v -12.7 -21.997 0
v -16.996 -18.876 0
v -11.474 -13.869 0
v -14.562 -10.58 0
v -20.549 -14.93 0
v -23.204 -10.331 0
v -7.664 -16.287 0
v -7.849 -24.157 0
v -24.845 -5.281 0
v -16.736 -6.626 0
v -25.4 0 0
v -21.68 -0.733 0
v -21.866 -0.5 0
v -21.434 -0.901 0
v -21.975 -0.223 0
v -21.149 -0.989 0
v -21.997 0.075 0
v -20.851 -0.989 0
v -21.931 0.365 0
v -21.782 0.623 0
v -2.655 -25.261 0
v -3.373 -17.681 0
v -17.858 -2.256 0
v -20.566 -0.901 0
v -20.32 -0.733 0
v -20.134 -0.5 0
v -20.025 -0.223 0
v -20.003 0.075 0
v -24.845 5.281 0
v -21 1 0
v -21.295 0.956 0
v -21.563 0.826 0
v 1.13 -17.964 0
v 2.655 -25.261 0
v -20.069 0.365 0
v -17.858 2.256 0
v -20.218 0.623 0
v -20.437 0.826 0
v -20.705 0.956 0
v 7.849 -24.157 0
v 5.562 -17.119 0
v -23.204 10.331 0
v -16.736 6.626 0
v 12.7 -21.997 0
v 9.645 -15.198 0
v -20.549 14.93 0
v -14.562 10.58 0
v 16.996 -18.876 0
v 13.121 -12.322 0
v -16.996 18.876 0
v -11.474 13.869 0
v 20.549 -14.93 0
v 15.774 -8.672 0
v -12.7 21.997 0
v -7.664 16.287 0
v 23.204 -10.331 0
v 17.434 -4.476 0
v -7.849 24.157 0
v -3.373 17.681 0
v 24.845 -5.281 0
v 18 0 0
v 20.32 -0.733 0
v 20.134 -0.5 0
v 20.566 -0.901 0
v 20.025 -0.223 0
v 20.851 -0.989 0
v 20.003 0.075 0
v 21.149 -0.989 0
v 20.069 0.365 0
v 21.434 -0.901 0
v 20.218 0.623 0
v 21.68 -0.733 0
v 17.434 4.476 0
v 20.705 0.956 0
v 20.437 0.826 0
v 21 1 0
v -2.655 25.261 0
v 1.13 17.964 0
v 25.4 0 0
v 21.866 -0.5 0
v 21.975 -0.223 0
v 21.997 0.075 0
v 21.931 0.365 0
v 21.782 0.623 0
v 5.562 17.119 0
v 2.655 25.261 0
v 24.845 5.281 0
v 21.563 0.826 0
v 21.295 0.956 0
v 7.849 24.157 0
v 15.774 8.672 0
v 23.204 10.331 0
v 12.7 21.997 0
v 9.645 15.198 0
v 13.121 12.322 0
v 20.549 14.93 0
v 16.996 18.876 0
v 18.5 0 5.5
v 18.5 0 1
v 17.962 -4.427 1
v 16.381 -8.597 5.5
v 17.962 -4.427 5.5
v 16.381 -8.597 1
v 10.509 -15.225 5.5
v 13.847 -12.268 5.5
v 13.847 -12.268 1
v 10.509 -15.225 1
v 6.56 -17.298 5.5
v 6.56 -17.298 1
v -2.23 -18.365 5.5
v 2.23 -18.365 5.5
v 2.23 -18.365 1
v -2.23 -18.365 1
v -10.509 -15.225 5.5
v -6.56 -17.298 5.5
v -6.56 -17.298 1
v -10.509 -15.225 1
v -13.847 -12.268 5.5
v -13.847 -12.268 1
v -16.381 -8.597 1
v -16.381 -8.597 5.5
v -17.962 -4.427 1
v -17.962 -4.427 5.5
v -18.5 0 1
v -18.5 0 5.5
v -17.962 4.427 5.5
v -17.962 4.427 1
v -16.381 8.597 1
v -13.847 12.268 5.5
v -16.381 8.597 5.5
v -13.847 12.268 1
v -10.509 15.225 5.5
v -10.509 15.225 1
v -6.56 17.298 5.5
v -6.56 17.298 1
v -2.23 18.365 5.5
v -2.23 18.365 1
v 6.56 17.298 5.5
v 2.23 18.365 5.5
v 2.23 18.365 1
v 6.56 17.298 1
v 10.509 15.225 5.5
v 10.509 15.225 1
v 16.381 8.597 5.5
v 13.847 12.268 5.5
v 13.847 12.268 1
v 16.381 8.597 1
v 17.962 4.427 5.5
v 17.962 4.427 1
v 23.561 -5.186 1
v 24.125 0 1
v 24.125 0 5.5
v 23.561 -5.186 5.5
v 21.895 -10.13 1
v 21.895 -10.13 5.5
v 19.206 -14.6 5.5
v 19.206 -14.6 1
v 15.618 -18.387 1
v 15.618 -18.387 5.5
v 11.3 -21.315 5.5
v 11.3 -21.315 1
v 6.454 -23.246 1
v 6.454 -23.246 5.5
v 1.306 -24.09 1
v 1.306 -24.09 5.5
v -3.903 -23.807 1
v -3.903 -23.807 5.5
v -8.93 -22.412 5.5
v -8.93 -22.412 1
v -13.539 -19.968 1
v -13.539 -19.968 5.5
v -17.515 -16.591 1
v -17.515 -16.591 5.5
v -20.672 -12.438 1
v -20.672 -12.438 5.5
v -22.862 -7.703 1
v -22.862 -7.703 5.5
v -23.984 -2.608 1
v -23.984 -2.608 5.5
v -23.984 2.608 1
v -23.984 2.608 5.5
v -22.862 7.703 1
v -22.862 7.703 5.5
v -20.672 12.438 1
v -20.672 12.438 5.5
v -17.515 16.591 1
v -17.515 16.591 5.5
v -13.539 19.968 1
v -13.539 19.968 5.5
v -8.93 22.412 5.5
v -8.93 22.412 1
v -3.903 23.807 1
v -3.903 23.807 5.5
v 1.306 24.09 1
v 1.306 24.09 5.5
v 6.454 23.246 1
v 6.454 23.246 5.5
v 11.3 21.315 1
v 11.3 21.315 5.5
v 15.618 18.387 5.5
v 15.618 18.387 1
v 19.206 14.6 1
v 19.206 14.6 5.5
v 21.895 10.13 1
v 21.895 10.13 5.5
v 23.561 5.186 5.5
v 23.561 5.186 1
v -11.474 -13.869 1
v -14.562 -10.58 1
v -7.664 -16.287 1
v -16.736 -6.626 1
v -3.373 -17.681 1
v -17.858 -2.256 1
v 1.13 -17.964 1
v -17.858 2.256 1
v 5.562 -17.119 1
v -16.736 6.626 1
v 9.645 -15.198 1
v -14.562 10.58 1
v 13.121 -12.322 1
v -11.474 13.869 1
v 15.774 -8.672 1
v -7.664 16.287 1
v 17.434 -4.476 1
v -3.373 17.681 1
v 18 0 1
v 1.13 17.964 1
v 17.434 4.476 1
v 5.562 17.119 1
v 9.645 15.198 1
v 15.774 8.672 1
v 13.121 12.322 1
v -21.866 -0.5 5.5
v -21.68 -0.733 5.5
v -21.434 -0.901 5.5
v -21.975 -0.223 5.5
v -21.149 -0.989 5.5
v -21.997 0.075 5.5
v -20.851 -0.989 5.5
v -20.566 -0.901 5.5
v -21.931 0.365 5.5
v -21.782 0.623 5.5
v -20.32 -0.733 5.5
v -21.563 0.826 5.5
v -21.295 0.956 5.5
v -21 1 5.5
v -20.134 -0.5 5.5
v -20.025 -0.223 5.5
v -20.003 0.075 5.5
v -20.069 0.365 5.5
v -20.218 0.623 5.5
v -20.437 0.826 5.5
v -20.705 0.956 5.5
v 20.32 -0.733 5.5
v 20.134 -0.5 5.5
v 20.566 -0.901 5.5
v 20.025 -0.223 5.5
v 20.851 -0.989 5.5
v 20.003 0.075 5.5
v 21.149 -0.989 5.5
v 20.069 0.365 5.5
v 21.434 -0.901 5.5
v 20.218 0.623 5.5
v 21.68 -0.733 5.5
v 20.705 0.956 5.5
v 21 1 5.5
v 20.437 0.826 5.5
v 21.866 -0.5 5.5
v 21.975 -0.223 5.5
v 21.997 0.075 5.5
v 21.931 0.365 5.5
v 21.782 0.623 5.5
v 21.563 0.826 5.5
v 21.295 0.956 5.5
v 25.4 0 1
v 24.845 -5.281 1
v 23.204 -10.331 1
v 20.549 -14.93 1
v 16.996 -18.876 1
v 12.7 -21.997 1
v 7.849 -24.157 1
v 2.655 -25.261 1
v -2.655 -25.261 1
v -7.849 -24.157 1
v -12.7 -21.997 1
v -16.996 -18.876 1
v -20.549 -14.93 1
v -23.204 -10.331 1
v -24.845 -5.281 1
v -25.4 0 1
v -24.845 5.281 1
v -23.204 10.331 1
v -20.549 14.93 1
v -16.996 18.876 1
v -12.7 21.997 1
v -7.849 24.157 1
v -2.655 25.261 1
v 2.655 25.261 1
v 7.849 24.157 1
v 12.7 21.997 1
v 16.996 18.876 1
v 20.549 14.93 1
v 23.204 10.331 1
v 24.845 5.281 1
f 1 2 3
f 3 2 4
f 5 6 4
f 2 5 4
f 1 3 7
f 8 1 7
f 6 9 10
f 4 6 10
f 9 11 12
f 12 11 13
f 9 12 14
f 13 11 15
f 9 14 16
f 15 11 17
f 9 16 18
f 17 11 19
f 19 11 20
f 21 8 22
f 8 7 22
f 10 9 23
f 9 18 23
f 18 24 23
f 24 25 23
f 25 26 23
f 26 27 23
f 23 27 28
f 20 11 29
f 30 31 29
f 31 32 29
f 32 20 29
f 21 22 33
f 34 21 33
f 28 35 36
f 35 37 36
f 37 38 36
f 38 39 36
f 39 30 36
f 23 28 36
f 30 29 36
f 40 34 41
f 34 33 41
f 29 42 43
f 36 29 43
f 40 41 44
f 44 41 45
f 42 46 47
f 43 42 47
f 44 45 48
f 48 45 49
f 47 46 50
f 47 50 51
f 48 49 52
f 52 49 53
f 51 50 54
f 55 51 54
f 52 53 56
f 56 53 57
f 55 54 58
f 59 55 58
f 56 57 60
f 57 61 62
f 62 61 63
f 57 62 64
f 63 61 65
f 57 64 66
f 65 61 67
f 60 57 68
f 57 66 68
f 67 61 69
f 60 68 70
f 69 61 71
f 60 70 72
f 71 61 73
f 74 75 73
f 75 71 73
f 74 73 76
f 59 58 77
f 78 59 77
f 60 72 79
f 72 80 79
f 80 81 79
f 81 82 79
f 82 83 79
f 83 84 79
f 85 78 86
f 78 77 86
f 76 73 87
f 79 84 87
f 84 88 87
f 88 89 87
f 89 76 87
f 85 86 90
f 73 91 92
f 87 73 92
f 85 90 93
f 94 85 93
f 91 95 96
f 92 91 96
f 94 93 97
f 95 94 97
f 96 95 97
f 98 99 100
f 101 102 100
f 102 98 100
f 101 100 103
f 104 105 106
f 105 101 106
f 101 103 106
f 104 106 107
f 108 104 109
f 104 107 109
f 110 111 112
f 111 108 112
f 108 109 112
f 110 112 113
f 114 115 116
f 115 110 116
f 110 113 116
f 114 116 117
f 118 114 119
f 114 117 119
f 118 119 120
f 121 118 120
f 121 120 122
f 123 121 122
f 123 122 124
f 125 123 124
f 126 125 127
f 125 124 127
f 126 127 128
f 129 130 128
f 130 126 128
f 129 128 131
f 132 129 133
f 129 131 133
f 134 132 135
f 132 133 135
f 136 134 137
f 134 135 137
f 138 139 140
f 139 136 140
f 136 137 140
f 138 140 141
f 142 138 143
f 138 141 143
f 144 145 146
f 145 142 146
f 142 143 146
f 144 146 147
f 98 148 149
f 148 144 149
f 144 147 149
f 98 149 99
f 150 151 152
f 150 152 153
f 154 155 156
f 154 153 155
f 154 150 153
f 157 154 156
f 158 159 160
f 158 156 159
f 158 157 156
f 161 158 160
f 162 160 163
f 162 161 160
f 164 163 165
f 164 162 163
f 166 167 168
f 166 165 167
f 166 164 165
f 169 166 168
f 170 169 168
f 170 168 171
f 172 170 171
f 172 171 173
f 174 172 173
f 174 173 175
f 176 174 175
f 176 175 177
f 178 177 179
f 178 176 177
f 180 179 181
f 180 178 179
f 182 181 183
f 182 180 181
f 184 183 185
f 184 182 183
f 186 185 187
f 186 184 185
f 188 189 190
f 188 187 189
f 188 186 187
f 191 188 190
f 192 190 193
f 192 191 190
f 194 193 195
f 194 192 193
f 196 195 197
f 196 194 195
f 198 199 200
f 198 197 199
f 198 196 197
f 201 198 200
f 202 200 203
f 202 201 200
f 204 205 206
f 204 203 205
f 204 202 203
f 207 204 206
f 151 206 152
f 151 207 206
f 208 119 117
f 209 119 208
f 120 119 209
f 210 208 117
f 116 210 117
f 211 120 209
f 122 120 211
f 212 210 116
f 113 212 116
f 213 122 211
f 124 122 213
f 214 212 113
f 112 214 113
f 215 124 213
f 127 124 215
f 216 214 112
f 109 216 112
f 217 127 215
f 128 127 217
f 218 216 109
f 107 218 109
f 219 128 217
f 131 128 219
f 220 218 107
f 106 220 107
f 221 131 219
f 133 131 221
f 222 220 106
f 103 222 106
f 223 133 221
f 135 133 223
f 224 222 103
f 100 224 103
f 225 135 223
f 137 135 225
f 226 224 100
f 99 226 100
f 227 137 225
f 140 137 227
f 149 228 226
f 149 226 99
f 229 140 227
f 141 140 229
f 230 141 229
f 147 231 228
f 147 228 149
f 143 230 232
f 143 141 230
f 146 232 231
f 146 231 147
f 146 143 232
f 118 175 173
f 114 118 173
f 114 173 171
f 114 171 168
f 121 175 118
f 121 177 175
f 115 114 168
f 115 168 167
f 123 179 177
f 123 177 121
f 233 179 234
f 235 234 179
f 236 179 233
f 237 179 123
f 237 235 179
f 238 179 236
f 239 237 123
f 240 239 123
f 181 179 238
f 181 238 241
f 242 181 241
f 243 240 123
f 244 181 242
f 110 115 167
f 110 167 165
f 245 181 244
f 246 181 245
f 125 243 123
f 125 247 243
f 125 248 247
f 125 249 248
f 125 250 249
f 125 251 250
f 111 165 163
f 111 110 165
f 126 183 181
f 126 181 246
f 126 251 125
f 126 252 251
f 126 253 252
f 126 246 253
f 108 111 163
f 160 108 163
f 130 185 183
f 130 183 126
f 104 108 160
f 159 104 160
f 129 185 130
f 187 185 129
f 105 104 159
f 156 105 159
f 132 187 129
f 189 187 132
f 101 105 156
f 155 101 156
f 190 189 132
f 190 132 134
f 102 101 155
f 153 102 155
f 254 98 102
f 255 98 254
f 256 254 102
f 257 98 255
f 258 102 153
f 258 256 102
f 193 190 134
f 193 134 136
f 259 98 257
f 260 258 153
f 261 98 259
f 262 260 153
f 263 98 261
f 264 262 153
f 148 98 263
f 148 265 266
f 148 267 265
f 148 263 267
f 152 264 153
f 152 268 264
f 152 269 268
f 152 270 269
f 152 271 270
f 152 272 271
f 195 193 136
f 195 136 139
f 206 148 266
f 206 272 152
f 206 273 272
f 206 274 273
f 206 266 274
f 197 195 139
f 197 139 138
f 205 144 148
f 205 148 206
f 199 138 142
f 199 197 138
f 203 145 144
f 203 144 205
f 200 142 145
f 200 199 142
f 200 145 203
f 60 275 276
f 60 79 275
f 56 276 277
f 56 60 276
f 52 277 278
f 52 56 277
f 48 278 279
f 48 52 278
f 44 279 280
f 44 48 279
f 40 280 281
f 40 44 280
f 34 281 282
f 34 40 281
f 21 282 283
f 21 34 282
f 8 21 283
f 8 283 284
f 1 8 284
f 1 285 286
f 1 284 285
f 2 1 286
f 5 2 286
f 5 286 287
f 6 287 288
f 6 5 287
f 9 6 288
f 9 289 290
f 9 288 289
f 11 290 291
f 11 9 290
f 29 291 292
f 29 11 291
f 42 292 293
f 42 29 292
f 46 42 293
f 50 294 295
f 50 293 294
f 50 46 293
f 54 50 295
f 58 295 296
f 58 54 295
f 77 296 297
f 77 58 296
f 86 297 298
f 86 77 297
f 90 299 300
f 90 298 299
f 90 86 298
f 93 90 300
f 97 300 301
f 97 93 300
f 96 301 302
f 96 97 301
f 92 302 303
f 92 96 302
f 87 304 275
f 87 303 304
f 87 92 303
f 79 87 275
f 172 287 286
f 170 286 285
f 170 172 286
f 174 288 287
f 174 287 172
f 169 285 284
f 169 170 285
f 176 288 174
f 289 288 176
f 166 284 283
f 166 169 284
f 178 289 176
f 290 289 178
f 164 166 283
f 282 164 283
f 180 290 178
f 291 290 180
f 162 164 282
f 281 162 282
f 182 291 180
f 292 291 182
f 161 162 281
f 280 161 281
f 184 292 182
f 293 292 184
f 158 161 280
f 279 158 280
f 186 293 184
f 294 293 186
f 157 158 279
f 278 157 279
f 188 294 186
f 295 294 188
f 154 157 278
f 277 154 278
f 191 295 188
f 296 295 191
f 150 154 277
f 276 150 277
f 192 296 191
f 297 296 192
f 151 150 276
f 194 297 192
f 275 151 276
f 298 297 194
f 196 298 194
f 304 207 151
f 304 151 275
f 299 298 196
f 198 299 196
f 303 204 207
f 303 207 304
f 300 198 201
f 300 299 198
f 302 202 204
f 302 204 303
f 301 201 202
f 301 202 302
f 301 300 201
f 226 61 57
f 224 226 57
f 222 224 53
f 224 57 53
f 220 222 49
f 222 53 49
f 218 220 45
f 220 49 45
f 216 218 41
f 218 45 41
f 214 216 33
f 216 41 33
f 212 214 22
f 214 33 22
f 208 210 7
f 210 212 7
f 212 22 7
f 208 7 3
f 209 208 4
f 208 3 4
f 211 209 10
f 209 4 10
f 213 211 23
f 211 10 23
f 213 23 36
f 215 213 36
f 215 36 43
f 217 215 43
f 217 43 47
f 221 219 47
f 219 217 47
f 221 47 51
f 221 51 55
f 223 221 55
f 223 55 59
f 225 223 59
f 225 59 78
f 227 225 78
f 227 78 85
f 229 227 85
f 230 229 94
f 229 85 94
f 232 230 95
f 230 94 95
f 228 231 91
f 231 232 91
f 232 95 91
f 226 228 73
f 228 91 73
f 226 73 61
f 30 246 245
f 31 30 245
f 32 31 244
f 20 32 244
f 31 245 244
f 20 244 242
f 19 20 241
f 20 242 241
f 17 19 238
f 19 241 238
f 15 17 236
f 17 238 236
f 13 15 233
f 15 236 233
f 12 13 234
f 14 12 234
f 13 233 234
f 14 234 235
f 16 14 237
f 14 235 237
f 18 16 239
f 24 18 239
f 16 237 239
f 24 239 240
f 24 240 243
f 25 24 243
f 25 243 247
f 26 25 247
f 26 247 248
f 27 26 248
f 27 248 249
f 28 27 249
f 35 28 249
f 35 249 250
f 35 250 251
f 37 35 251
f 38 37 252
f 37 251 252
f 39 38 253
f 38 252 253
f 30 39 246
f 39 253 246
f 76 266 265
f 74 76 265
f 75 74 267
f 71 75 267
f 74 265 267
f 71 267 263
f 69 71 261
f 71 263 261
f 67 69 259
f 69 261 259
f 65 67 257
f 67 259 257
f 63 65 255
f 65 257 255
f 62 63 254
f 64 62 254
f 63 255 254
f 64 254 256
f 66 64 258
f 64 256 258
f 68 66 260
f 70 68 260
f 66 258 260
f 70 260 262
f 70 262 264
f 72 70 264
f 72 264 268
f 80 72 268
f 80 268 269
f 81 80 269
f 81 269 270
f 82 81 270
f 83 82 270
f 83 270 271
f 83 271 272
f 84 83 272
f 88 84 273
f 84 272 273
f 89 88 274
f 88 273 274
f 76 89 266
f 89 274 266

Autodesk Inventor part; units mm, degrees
ref_plane "YZ Plane" through (0, 0, 0) normal (1, 0, 0) x (0, 1, 0)
ref_plane "XZ Plane" through (0, 0, 0) normal (0, 1, 0) x (-1, 0, 0)
ref_plane "XY Plane" through (0, 0, 0) normal (0, 0, 1) x (1, 0, 0)
sketch "Sketch1" plane through (0, 0, 0) normal (0, 0, 1) x (1, 0, 0)
  circle A0 centre (0, 0) radius 18.5
  circle A1 centre (0, 0) radius 24.125
  circle A2 centre (0, 0) radius 25.4
  circle A3 centre (0, 0) radius 18
  point P0 (-21, 0)
  point P1 (21, 0)
  dimension "d" = 37
  dimension "d1" = 48.25
  dimension "d2" = 50.8
  dimension "d14" = 21
  dimension "d15" = 21
  dimension "d16" = 36
extrude "Extrusion1" add sketch "Sketch1" along normal blind 5.5 contours A1
extrude "Extrusion2" add sketch "Sketch1" along normal blind 1 contours A2
hole "Hole1" at (-21, 0, 0) at (21, 0, 0) direction (0, 0, 1) diameter 2 end through all
extrude "Extrusion3" add sketch "Sketch1" along normal blind 1 contours A0
properties part number "Adapter-D37mm-SM2"
